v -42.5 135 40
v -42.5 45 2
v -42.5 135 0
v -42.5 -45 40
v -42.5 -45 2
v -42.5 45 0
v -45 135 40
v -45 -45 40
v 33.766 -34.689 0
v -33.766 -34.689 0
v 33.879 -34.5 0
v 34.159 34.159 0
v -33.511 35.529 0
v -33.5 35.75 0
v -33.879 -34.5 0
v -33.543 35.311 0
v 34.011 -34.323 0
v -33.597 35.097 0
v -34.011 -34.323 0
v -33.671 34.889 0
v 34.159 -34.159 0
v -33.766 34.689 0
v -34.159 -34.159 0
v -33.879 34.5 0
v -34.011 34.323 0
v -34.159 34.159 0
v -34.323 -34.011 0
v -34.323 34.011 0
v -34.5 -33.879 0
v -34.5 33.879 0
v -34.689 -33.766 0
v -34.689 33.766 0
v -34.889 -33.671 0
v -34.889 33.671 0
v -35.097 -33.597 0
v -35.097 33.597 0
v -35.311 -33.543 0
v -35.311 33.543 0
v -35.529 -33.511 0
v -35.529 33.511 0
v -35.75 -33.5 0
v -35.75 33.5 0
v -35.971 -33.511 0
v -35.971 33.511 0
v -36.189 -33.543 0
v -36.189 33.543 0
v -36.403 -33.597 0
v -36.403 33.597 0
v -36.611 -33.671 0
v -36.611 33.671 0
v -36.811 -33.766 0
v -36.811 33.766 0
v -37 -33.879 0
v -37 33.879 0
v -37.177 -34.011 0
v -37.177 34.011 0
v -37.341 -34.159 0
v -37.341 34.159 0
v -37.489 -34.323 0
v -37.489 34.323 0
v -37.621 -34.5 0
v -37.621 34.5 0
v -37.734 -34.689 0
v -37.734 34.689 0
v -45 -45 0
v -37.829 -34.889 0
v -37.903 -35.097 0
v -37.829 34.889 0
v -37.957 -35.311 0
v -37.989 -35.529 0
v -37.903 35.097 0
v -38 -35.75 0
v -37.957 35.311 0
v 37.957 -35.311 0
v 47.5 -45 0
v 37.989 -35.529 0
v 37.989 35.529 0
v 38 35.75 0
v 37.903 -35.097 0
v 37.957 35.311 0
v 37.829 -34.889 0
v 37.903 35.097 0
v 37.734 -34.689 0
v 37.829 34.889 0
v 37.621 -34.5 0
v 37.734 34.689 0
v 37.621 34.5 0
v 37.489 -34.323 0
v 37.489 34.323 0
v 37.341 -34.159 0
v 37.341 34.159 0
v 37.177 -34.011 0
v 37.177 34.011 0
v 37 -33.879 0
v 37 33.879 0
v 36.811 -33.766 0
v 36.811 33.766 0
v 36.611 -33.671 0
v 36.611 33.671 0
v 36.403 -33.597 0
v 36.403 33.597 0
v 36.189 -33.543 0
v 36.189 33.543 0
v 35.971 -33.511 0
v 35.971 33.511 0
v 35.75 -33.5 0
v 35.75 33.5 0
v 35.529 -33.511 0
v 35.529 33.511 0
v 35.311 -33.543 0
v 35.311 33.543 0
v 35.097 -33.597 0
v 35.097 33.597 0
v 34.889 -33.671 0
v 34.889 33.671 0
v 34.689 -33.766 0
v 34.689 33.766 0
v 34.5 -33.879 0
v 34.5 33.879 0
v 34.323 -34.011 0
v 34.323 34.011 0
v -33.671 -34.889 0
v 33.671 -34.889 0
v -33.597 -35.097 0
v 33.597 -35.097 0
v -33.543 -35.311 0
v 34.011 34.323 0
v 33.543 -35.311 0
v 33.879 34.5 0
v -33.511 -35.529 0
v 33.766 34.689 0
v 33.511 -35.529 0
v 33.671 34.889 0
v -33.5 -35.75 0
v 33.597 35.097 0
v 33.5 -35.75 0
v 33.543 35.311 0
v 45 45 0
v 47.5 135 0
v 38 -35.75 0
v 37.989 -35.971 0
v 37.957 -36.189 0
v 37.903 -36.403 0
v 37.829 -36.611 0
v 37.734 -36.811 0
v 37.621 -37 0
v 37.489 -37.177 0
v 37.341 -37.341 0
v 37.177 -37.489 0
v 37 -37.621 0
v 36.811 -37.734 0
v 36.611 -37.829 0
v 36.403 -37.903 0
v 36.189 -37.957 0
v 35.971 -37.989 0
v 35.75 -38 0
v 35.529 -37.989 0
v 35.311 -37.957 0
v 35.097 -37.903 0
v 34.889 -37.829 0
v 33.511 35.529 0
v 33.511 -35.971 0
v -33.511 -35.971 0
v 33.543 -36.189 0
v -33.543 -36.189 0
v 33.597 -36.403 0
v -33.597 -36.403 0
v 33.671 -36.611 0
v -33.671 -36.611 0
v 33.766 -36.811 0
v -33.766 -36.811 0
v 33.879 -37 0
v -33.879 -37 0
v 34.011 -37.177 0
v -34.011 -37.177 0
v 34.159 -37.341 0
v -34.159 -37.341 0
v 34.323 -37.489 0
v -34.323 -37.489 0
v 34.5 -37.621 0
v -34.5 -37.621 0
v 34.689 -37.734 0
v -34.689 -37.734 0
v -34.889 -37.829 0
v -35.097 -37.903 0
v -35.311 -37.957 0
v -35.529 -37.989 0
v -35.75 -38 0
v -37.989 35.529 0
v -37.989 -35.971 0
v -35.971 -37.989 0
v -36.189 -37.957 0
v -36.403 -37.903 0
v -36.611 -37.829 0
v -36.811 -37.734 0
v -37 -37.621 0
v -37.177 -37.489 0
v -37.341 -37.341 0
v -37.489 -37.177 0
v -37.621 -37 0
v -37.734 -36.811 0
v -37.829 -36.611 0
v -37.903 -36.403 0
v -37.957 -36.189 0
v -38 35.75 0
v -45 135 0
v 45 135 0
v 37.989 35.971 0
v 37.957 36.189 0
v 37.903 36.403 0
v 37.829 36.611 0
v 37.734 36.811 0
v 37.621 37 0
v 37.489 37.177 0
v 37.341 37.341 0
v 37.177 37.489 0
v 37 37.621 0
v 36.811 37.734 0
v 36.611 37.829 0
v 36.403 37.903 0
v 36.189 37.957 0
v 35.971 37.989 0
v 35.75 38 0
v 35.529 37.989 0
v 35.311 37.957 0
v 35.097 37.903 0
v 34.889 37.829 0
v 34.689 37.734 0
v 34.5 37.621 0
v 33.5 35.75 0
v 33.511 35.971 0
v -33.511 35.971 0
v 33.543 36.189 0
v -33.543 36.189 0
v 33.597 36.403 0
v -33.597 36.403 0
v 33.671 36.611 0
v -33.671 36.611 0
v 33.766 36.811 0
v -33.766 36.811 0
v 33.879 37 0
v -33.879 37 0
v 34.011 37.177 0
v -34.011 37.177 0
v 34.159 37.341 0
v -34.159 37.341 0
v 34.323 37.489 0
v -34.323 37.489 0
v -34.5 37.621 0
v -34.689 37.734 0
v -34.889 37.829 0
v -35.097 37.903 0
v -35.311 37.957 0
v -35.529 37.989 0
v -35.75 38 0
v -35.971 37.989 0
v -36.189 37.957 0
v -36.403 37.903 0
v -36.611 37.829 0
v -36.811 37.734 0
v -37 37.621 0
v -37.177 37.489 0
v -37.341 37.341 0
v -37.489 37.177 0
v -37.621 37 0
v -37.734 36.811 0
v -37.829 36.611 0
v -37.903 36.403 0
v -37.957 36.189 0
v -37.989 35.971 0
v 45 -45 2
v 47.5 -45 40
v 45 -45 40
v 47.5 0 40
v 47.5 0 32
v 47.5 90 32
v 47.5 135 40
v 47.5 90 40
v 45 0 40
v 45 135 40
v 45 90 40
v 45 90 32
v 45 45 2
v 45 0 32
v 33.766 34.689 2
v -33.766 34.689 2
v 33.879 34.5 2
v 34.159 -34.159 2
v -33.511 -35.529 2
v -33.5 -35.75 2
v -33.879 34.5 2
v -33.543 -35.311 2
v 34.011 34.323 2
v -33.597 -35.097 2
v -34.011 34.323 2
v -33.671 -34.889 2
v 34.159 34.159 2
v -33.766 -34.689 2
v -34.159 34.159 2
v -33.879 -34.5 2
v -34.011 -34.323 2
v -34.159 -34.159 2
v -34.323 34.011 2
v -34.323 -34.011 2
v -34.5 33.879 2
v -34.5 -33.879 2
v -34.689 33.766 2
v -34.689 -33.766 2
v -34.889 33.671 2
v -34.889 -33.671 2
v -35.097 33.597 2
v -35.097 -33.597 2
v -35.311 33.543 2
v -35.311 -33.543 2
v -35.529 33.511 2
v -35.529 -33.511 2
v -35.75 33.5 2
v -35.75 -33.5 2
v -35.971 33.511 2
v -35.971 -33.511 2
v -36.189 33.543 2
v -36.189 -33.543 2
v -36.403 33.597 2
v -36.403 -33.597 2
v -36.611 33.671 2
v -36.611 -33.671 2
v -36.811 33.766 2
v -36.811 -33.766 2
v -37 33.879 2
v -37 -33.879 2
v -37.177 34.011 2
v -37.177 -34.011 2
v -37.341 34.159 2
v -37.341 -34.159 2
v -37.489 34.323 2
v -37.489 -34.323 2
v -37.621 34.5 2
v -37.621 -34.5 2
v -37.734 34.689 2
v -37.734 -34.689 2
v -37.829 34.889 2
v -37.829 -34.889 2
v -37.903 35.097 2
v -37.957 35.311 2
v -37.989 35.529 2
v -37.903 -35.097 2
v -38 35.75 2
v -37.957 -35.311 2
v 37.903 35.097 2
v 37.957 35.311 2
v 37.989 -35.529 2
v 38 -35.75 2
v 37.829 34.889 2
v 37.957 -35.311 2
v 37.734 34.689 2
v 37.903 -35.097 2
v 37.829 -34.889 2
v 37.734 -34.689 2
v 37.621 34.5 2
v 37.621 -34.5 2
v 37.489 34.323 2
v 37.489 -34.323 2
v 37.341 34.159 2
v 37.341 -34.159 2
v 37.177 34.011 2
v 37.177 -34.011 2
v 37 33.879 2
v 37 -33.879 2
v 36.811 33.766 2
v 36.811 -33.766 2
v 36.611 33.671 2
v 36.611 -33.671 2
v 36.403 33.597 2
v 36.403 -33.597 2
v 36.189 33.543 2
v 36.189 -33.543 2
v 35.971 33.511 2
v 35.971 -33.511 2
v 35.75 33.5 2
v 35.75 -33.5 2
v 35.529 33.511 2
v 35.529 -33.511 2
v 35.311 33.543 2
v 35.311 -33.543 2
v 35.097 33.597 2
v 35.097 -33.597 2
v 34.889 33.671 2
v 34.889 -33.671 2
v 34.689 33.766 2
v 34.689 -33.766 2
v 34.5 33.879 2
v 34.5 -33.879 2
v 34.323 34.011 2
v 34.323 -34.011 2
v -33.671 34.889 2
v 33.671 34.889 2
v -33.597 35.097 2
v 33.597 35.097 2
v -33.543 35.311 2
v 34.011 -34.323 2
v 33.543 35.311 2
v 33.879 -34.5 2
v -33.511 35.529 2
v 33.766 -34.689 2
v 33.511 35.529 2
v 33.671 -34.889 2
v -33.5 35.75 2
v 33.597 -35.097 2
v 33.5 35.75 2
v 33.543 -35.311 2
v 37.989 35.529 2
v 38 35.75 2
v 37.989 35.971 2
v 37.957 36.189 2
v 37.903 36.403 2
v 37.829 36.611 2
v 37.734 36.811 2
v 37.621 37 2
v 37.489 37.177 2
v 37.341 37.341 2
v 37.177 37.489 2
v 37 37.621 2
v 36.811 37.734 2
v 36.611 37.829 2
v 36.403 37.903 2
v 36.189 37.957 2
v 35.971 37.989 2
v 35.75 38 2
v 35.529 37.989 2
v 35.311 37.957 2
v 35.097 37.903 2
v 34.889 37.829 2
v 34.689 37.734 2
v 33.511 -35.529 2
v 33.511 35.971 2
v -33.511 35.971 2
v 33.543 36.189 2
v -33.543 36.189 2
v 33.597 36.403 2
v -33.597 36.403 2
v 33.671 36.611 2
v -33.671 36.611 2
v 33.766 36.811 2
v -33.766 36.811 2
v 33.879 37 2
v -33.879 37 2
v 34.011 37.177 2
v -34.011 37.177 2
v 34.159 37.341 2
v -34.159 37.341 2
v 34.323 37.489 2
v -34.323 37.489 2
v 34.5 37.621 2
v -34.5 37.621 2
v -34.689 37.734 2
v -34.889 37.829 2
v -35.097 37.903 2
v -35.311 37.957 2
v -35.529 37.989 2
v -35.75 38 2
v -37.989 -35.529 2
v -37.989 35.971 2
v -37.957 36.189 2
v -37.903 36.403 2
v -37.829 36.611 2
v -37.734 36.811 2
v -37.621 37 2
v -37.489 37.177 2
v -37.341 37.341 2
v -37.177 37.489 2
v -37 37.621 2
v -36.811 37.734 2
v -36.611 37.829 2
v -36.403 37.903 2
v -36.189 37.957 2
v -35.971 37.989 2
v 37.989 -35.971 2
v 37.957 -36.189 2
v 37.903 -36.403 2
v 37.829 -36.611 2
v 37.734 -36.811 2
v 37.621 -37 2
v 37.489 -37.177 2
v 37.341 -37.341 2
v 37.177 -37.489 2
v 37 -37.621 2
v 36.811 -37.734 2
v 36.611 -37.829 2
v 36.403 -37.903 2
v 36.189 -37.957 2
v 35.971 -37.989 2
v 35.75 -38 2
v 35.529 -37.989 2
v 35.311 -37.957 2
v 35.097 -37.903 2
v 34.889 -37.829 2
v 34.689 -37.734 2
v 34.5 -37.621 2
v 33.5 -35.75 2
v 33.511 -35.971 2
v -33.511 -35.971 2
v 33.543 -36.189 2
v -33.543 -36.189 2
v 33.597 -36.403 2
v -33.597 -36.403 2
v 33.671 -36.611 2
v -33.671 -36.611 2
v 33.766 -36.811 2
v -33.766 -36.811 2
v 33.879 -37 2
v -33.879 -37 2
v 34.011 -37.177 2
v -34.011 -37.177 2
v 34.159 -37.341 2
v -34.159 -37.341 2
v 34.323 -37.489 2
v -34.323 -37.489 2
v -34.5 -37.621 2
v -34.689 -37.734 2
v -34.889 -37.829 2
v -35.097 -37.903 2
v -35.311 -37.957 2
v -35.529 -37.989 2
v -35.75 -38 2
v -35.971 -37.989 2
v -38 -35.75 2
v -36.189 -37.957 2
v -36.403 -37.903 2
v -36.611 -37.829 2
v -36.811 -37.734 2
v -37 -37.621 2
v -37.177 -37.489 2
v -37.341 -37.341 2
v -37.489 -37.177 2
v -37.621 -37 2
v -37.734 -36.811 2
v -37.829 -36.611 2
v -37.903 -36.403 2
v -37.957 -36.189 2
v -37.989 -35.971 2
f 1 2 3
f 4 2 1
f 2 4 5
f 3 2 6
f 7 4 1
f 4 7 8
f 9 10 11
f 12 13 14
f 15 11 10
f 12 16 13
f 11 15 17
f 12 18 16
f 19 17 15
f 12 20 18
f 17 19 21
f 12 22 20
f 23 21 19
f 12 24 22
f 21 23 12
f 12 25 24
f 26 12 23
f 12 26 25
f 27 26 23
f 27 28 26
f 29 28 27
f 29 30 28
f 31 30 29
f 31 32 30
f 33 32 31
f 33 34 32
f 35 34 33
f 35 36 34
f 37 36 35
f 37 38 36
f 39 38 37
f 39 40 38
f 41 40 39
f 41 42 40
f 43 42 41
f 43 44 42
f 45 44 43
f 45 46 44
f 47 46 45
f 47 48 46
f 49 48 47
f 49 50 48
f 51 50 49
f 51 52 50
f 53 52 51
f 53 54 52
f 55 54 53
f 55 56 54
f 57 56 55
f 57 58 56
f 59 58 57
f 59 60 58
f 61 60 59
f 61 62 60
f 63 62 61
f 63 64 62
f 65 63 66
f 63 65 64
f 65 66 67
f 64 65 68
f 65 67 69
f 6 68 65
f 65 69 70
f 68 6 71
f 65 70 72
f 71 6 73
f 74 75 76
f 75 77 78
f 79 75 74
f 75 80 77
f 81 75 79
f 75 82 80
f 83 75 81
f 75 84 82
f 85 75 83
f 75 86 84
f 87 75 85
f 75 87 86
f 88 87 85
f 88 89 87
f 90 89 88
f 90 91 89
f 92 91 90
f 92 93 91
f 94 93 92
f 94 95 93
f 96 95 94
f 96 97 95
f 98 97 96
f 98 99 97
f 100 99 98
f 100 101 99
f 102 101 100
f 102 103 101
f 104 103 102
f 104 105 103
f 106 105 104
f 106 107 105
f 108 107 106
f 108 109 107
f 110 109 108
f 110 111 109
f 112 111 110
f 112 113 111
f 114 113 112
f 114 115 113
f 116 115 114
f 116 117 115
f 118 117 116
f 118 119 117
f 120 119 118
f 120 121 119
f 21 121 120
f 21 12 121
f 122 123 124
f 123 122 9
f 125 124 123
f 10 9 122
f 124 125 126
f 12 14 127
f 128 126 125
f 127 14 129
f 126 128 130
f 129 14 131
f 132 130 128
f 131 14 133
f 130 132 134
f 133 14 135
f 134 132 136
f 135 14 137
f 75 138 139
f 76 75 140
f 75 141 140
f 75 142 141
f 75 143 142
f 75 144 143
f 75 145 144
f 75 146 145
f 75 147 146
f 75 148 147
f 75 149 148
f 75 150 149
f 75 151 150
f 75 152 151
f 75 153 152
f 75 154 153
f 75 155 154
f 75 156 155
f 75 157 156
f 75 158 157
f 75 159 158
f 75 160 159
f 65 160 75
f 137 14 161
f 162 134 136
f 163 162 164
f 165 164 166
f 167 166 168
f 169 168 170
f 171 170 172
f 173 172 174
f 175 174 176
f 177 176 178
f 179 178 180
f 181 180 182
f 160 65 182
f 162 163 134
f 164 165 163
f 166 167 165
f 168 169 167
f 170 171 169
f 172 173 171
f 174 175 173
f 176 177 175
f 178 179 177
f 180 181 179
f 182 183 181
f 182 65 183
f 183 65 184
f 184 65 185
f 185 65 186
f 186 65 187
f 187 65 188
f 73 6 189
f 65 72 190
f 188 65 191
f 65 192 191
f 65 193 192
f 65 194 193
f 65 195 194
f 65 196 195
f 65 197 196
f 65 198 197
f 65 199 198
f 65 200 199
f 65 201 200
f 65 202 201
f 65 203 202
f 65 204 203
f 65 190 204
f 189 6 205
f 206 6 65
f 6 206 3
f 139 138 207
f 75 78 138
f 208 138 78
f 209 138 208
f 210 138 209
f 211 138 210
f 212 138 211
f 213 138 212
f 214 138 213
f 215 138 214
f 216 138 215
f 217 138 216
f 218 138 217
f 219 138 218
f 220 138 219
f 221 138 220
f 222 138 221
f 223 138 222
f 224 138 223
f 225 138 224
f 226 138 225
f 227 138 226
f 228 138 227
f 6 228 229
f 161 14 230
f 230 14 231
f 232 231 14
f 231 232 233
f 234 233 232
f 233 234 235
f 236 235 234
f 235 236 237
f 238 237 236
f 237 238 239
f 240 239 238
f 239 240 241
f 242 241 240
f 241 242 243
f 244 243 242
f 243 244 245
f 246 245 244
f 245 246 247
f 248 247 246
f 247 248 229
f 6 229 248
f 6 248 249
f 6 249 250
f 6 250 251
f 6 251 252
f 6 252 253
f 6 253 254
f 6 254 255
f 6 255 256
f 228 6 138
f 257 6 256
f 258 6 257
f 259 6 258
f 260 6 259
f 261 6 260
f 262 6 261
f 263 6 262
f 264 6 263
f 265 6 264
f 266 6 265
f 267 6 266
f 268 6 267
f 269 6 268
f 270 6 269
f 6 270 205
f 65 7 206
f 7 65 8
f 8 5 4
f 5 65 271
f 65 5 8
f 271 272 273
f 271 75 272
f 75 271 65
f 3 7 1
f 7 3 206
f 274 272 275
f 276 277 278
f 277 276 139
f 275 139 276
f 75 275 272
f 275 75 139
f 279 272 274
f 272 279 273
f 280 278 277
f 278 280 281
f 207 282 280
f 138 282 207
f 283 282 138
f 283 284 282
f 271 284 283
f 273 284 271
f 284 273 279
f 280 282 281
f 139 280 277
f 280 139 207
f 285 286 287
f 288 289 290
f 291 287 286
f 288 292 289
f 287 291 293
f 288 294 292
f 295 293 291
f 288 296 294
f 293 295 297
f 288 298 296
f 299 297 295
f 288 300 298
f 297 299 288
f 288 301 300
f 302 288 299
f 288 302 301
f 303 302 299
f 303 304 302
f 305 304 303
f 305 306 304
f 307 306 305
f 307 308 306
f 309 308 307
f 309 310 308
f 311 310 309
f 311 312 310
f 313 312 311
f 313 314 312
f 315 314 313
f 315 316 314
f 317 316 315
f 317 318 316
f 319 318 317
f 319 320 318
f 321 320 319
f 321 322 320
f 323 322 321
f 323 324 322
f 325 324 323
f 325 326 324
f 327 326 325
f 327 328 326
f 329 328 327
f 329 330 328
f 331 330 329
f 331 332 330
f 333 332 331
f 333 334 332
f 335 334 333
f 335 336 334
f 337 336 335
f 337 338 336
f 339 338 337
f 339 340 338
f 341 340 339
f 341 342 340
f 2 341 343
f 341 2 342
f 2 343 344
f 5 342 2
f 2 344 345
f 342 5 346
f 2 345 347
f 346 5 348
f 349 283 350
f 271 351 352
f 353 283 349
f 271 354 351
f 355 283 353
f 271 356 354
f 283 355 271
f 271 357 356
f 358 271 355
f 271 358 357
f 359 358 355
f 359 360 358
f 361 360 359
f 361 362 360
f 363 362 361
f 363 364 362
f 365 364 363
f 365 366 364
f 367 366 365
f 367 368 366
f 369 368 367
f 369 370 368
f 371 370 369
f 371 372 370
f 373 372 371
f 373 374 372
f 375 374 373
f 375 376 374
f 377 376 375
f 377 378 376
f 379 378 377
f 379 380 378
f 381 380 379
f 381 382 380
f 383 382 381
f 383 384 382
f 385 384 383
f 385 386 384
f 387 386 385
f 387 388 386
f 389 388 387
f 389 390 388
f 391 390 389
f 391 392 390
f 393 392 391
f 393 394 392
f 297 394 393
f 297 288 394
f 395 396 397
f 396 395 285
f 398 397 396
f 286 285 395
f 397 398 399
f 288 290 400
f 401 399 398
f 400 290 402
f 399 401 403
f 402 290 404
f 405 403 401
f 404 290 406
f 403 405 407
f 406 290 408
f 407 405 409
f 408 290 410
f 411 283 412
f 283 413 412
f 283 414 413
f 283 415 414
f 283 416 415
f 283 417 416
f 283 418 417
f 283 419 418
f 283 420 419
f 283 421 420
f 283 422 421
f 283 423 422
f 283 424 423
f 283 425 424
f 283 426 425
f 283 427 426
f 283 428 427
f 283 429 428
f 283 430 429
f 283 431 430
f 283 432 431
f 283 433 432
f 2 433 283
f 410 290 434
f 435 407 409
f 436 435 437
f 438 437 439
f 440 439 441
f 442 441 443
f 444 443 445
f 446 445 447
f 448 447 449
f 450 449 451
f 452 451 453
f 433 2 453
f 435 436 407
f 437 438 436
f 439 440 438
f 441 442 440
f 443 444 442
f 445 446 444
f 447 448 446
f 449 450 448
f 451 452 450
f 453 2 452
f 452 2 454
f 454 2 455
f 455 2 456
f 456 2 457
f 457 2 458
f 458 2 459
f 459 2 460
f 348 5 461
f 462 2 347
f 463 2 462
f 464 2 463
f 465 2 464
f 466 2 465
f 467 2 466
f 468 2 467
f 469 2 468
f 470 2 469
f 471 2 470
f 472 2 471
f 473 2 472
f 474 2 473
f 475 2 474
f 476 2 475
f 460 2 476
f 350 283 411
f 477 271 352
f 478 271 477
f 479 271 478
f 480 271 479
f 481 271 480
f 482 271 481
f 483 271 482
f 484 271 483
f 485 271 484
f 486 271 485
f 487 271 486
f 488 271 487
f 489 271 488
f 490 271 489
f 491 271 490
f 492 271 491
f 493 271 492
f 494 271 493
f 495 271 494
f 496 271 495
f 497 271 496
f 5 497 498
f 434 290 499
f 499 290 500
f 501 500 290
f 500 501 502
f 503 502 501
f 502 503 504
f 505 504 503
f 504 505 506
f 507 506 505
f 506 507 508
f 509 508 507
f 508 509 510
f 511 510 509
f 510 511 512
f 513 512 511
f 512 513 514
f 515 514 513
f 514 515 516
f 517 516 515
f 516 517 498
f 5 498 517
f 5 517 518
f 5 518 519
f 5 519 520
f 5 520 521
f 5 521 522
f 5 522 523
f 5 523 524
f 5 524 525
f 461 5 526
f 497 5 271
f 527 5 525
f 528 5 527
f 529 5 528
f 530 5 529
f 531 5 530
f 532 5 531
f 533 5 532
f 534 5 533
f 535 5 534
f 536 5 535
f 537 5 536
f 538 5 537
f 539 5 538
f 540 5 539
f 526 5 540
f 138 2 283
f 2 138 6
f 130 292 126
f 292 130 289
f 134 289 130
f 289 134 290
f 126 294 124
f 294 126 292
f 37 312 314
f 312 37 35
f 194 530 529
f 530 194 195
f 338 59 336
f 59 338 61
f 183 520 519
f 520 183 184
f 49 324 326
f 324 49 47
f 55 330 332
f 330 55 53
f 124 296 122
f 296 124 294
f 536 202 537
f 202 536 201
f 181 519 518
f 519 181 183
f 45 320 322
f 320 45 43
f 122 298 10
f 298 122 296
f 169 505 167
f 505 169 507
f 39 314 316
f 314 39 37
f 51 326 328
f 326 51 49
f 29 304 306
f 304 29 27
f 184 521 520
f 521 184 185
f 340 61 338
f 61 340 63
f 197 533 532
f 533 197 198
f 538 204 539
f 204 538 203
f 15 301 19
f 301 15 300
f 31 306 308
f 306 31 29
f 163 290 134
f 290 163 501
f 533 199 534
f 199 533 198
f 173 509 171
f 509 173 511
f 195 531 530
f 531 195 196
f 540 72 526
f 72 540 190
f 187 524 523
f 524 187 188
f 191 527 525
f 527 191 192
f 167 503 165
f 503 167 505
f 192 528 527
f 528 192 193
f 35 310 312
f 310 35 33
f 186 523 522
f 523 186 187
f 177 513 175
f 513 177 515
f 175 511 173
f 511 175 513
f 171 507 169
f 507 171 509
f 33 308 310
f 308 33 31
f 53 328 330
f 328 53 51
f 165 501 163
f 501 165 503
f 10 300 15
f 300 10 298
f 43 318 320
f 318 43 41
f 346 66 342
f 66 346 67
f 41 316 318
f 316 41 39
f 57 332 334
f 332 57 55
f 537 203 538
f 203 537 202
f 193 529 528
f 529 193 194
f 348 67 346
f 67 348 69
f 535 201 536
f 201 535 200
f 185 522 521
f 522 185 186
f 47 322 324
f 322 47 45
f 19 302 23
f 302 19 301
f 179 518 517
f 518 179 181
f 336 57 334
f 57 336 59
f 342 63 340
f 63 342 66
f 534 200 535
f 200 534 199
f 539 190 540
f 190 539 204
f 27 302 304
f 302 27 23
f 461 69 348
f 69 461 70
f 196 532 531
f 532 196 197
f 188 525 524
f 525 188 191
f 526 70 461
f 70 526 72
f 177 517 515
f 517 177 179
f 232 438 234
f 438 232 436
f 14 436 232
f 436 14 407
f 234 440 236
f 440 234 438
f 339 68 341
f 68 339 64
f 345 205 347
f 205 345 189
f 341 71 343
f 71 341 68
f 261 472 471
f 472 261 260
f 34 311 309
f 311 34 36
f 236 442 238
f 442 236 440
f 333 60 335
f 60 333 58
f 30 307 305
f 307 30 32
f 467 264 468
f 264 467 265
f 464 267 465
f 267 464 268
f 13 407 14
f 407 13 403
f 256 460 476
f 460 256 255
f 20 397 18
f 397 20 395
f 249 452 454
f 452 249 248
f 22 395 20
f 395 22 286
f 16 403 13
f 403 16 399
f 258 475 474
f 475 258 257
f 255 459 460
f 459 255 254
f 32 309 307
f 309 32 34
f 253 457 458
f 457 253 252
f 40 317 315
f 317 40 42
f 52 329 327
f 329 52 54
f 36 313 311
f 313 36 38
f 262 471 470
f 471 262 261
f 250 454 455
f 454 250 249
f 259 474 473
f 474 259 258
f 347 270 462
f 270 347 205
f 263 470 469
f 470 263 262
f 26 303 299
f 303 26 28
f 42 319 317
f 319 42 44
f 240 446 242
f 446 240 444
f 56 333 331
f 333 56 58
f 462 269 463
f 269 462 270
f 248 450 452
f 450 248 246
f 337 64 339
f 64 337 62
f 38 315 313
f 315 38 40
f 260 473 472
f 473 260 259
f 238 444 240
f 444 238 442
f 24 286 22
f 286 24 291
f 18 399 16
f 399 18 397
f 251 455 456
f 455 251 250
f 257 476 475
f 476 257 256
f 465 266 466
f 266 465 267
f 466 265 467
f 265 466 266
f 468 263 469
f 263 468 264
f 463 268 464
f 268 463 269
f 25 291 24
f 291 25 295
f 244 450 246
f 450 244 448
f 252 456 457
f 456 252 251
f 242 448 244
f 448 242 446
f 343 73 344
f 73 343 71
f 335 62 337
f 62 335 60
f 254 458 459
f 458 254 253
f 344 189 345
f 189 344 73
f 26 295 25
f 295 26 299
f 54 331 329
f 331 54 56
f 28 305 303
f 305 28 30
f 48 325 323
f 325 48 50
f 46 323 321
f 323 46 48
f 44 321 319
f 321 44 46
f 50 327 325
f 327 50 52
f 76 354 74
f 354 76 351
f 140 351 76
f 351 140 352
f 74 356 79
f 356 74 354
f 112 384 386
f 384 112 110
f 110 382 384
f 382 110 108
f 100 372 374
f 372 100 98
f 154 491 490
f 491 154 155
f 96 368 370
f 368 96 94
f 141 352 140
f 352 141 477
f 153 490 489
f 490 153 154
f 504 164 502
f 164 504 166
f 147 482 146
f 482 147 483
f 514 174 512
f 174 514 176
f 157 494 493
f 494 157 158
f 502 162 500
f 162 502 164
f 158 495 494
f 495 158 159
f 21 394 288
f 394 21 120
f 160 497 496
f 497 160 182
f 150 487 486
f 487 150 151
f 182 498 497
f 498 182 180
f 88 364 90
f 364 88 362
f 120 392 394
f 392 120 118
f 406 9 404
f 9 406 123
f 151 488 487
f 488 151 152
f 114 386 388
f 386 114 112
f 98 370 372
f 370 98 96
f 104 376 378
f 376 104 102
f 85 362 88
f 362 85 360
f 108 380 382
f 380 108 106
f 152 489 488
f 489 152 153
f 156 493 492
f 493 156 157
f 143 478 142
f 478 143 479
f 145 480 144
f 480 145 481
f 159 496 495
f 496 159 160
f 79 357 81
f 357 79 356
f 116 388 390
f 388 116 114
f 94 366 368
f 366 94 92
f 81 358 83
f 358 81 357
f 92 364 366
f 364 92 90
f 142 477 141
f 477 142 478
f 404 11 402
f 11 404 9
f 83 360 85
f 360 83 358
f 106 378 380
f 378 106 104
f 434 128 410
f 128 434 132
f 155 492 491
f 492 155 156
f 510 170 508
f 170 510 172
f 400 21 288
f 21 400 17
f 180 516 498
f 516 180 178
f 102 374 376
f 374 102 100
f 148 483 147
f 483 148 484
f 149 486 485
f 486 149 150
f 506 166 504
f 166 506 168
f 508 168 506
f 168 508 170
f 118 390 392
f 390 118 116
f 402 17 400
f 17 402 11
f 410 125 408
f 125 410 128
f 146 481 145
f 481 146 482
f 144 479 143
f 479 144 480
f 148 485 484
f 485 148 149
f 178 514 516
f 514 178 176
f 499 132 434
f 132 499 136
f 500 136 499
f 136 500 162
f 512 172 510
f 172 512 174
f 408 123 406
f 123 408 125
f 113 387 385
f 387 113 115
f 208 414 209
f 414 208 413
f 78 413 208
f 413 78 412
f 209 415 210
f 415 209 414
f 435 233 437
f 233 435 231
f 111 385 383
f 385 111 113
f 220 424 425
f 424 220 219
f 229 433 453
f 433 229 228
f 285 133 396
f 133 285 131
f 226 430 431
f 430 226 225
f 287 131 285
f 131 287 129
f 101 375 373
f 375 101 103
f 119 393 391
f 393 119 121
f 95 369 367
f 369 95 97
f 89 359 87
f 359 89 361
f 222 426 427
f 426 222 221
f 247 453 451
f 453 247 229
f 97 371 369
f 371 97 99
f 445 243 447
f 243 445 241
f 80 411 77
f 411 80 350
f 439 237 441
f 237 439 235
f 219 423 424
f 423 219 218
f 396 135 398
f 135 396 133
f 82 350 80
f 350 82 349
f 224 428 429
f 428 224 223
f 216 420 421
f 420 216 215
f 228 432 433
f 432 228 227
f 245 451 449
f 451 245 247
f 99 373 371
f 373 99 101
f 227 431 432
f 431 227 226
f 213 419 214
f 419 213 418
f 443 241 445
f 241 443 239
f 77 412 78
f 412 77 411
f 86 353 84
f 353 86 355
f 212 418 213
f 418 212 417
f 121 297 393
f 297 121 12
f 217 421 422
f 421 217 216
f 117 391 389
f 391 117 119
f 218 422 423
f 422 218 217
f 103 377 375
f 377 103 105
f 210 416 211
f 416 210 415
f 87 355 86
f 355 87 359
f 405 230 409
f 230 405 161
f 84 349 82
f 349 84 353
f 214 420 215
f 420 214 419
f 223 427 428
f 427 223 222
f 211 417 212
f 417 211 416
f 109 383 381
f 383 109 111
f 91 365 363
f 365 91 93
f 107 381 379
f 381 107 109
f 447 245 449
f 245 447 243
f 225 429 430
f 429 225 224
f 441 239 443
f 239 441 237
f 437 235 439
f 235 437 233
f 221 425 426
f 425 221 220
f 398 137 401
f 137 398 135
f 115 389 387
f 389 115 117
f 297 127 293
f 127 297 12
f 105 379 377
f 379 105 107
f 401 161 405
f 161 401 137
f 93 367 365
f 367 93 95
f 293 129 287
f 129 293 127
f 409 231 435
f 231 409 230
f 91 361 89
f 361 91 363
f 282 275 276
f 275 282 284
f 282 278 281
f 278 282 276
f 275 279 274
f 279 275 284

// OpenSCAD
// Housing for a DIY magnetic stirrer built from an 80 mm PC case fan
// Printed upside down: top plate on the bed, box open at the top.

$fn = 64;

// ---- Dimensions (mm) ----
housing_outer  = 90;    // housing outer size (X x Y)
top_thick      = 2;     // top plate thickness (z = 0 to 2)
wall_thick     = 2.5;   // wall thickness
total_h       = 40;     // overall height (top of walls)
cable_h       = 8;     // cable notch depth from open edge (z = 32 to 40)
screw_pitch   = 71.5;   // square pitch for M4 screw holes
screw_d       = 4.5;    // M4 screw hole diameter

eps           = 0.5;   // cutter overshoot past faces

difference() {
    union() {
        // Top plate
        translate([-housing_outer/2, -housing_outer/2, 0])
            cube([housing_outer, housing_outer, top_thick]);
        // Four walls
        for (x = [-1, 1])
            for (y = [-1, 1])
                translate([x * housing_outer/2, y * housing_outer/2, 0])
                    cube([wall_thick, housing_outer, total_h]);
    }

    // M4 screw holes through top plate, centred on plate
    for (x = [-screw_pitch/2, screw_pitch/2])
        for (y = [-screw_pitch/2, screw_pitch/2])
            translate([x, y, -eps])
                cylinder(d = screw_d, h = top_thick + 2*eps);

    // Cable notch in one wall, centred along the wall
    translate([housing_outer/2 - 6, 0, total_h - cable_h])
        cube([12, housing_outer, cable_h + eps]);
}
